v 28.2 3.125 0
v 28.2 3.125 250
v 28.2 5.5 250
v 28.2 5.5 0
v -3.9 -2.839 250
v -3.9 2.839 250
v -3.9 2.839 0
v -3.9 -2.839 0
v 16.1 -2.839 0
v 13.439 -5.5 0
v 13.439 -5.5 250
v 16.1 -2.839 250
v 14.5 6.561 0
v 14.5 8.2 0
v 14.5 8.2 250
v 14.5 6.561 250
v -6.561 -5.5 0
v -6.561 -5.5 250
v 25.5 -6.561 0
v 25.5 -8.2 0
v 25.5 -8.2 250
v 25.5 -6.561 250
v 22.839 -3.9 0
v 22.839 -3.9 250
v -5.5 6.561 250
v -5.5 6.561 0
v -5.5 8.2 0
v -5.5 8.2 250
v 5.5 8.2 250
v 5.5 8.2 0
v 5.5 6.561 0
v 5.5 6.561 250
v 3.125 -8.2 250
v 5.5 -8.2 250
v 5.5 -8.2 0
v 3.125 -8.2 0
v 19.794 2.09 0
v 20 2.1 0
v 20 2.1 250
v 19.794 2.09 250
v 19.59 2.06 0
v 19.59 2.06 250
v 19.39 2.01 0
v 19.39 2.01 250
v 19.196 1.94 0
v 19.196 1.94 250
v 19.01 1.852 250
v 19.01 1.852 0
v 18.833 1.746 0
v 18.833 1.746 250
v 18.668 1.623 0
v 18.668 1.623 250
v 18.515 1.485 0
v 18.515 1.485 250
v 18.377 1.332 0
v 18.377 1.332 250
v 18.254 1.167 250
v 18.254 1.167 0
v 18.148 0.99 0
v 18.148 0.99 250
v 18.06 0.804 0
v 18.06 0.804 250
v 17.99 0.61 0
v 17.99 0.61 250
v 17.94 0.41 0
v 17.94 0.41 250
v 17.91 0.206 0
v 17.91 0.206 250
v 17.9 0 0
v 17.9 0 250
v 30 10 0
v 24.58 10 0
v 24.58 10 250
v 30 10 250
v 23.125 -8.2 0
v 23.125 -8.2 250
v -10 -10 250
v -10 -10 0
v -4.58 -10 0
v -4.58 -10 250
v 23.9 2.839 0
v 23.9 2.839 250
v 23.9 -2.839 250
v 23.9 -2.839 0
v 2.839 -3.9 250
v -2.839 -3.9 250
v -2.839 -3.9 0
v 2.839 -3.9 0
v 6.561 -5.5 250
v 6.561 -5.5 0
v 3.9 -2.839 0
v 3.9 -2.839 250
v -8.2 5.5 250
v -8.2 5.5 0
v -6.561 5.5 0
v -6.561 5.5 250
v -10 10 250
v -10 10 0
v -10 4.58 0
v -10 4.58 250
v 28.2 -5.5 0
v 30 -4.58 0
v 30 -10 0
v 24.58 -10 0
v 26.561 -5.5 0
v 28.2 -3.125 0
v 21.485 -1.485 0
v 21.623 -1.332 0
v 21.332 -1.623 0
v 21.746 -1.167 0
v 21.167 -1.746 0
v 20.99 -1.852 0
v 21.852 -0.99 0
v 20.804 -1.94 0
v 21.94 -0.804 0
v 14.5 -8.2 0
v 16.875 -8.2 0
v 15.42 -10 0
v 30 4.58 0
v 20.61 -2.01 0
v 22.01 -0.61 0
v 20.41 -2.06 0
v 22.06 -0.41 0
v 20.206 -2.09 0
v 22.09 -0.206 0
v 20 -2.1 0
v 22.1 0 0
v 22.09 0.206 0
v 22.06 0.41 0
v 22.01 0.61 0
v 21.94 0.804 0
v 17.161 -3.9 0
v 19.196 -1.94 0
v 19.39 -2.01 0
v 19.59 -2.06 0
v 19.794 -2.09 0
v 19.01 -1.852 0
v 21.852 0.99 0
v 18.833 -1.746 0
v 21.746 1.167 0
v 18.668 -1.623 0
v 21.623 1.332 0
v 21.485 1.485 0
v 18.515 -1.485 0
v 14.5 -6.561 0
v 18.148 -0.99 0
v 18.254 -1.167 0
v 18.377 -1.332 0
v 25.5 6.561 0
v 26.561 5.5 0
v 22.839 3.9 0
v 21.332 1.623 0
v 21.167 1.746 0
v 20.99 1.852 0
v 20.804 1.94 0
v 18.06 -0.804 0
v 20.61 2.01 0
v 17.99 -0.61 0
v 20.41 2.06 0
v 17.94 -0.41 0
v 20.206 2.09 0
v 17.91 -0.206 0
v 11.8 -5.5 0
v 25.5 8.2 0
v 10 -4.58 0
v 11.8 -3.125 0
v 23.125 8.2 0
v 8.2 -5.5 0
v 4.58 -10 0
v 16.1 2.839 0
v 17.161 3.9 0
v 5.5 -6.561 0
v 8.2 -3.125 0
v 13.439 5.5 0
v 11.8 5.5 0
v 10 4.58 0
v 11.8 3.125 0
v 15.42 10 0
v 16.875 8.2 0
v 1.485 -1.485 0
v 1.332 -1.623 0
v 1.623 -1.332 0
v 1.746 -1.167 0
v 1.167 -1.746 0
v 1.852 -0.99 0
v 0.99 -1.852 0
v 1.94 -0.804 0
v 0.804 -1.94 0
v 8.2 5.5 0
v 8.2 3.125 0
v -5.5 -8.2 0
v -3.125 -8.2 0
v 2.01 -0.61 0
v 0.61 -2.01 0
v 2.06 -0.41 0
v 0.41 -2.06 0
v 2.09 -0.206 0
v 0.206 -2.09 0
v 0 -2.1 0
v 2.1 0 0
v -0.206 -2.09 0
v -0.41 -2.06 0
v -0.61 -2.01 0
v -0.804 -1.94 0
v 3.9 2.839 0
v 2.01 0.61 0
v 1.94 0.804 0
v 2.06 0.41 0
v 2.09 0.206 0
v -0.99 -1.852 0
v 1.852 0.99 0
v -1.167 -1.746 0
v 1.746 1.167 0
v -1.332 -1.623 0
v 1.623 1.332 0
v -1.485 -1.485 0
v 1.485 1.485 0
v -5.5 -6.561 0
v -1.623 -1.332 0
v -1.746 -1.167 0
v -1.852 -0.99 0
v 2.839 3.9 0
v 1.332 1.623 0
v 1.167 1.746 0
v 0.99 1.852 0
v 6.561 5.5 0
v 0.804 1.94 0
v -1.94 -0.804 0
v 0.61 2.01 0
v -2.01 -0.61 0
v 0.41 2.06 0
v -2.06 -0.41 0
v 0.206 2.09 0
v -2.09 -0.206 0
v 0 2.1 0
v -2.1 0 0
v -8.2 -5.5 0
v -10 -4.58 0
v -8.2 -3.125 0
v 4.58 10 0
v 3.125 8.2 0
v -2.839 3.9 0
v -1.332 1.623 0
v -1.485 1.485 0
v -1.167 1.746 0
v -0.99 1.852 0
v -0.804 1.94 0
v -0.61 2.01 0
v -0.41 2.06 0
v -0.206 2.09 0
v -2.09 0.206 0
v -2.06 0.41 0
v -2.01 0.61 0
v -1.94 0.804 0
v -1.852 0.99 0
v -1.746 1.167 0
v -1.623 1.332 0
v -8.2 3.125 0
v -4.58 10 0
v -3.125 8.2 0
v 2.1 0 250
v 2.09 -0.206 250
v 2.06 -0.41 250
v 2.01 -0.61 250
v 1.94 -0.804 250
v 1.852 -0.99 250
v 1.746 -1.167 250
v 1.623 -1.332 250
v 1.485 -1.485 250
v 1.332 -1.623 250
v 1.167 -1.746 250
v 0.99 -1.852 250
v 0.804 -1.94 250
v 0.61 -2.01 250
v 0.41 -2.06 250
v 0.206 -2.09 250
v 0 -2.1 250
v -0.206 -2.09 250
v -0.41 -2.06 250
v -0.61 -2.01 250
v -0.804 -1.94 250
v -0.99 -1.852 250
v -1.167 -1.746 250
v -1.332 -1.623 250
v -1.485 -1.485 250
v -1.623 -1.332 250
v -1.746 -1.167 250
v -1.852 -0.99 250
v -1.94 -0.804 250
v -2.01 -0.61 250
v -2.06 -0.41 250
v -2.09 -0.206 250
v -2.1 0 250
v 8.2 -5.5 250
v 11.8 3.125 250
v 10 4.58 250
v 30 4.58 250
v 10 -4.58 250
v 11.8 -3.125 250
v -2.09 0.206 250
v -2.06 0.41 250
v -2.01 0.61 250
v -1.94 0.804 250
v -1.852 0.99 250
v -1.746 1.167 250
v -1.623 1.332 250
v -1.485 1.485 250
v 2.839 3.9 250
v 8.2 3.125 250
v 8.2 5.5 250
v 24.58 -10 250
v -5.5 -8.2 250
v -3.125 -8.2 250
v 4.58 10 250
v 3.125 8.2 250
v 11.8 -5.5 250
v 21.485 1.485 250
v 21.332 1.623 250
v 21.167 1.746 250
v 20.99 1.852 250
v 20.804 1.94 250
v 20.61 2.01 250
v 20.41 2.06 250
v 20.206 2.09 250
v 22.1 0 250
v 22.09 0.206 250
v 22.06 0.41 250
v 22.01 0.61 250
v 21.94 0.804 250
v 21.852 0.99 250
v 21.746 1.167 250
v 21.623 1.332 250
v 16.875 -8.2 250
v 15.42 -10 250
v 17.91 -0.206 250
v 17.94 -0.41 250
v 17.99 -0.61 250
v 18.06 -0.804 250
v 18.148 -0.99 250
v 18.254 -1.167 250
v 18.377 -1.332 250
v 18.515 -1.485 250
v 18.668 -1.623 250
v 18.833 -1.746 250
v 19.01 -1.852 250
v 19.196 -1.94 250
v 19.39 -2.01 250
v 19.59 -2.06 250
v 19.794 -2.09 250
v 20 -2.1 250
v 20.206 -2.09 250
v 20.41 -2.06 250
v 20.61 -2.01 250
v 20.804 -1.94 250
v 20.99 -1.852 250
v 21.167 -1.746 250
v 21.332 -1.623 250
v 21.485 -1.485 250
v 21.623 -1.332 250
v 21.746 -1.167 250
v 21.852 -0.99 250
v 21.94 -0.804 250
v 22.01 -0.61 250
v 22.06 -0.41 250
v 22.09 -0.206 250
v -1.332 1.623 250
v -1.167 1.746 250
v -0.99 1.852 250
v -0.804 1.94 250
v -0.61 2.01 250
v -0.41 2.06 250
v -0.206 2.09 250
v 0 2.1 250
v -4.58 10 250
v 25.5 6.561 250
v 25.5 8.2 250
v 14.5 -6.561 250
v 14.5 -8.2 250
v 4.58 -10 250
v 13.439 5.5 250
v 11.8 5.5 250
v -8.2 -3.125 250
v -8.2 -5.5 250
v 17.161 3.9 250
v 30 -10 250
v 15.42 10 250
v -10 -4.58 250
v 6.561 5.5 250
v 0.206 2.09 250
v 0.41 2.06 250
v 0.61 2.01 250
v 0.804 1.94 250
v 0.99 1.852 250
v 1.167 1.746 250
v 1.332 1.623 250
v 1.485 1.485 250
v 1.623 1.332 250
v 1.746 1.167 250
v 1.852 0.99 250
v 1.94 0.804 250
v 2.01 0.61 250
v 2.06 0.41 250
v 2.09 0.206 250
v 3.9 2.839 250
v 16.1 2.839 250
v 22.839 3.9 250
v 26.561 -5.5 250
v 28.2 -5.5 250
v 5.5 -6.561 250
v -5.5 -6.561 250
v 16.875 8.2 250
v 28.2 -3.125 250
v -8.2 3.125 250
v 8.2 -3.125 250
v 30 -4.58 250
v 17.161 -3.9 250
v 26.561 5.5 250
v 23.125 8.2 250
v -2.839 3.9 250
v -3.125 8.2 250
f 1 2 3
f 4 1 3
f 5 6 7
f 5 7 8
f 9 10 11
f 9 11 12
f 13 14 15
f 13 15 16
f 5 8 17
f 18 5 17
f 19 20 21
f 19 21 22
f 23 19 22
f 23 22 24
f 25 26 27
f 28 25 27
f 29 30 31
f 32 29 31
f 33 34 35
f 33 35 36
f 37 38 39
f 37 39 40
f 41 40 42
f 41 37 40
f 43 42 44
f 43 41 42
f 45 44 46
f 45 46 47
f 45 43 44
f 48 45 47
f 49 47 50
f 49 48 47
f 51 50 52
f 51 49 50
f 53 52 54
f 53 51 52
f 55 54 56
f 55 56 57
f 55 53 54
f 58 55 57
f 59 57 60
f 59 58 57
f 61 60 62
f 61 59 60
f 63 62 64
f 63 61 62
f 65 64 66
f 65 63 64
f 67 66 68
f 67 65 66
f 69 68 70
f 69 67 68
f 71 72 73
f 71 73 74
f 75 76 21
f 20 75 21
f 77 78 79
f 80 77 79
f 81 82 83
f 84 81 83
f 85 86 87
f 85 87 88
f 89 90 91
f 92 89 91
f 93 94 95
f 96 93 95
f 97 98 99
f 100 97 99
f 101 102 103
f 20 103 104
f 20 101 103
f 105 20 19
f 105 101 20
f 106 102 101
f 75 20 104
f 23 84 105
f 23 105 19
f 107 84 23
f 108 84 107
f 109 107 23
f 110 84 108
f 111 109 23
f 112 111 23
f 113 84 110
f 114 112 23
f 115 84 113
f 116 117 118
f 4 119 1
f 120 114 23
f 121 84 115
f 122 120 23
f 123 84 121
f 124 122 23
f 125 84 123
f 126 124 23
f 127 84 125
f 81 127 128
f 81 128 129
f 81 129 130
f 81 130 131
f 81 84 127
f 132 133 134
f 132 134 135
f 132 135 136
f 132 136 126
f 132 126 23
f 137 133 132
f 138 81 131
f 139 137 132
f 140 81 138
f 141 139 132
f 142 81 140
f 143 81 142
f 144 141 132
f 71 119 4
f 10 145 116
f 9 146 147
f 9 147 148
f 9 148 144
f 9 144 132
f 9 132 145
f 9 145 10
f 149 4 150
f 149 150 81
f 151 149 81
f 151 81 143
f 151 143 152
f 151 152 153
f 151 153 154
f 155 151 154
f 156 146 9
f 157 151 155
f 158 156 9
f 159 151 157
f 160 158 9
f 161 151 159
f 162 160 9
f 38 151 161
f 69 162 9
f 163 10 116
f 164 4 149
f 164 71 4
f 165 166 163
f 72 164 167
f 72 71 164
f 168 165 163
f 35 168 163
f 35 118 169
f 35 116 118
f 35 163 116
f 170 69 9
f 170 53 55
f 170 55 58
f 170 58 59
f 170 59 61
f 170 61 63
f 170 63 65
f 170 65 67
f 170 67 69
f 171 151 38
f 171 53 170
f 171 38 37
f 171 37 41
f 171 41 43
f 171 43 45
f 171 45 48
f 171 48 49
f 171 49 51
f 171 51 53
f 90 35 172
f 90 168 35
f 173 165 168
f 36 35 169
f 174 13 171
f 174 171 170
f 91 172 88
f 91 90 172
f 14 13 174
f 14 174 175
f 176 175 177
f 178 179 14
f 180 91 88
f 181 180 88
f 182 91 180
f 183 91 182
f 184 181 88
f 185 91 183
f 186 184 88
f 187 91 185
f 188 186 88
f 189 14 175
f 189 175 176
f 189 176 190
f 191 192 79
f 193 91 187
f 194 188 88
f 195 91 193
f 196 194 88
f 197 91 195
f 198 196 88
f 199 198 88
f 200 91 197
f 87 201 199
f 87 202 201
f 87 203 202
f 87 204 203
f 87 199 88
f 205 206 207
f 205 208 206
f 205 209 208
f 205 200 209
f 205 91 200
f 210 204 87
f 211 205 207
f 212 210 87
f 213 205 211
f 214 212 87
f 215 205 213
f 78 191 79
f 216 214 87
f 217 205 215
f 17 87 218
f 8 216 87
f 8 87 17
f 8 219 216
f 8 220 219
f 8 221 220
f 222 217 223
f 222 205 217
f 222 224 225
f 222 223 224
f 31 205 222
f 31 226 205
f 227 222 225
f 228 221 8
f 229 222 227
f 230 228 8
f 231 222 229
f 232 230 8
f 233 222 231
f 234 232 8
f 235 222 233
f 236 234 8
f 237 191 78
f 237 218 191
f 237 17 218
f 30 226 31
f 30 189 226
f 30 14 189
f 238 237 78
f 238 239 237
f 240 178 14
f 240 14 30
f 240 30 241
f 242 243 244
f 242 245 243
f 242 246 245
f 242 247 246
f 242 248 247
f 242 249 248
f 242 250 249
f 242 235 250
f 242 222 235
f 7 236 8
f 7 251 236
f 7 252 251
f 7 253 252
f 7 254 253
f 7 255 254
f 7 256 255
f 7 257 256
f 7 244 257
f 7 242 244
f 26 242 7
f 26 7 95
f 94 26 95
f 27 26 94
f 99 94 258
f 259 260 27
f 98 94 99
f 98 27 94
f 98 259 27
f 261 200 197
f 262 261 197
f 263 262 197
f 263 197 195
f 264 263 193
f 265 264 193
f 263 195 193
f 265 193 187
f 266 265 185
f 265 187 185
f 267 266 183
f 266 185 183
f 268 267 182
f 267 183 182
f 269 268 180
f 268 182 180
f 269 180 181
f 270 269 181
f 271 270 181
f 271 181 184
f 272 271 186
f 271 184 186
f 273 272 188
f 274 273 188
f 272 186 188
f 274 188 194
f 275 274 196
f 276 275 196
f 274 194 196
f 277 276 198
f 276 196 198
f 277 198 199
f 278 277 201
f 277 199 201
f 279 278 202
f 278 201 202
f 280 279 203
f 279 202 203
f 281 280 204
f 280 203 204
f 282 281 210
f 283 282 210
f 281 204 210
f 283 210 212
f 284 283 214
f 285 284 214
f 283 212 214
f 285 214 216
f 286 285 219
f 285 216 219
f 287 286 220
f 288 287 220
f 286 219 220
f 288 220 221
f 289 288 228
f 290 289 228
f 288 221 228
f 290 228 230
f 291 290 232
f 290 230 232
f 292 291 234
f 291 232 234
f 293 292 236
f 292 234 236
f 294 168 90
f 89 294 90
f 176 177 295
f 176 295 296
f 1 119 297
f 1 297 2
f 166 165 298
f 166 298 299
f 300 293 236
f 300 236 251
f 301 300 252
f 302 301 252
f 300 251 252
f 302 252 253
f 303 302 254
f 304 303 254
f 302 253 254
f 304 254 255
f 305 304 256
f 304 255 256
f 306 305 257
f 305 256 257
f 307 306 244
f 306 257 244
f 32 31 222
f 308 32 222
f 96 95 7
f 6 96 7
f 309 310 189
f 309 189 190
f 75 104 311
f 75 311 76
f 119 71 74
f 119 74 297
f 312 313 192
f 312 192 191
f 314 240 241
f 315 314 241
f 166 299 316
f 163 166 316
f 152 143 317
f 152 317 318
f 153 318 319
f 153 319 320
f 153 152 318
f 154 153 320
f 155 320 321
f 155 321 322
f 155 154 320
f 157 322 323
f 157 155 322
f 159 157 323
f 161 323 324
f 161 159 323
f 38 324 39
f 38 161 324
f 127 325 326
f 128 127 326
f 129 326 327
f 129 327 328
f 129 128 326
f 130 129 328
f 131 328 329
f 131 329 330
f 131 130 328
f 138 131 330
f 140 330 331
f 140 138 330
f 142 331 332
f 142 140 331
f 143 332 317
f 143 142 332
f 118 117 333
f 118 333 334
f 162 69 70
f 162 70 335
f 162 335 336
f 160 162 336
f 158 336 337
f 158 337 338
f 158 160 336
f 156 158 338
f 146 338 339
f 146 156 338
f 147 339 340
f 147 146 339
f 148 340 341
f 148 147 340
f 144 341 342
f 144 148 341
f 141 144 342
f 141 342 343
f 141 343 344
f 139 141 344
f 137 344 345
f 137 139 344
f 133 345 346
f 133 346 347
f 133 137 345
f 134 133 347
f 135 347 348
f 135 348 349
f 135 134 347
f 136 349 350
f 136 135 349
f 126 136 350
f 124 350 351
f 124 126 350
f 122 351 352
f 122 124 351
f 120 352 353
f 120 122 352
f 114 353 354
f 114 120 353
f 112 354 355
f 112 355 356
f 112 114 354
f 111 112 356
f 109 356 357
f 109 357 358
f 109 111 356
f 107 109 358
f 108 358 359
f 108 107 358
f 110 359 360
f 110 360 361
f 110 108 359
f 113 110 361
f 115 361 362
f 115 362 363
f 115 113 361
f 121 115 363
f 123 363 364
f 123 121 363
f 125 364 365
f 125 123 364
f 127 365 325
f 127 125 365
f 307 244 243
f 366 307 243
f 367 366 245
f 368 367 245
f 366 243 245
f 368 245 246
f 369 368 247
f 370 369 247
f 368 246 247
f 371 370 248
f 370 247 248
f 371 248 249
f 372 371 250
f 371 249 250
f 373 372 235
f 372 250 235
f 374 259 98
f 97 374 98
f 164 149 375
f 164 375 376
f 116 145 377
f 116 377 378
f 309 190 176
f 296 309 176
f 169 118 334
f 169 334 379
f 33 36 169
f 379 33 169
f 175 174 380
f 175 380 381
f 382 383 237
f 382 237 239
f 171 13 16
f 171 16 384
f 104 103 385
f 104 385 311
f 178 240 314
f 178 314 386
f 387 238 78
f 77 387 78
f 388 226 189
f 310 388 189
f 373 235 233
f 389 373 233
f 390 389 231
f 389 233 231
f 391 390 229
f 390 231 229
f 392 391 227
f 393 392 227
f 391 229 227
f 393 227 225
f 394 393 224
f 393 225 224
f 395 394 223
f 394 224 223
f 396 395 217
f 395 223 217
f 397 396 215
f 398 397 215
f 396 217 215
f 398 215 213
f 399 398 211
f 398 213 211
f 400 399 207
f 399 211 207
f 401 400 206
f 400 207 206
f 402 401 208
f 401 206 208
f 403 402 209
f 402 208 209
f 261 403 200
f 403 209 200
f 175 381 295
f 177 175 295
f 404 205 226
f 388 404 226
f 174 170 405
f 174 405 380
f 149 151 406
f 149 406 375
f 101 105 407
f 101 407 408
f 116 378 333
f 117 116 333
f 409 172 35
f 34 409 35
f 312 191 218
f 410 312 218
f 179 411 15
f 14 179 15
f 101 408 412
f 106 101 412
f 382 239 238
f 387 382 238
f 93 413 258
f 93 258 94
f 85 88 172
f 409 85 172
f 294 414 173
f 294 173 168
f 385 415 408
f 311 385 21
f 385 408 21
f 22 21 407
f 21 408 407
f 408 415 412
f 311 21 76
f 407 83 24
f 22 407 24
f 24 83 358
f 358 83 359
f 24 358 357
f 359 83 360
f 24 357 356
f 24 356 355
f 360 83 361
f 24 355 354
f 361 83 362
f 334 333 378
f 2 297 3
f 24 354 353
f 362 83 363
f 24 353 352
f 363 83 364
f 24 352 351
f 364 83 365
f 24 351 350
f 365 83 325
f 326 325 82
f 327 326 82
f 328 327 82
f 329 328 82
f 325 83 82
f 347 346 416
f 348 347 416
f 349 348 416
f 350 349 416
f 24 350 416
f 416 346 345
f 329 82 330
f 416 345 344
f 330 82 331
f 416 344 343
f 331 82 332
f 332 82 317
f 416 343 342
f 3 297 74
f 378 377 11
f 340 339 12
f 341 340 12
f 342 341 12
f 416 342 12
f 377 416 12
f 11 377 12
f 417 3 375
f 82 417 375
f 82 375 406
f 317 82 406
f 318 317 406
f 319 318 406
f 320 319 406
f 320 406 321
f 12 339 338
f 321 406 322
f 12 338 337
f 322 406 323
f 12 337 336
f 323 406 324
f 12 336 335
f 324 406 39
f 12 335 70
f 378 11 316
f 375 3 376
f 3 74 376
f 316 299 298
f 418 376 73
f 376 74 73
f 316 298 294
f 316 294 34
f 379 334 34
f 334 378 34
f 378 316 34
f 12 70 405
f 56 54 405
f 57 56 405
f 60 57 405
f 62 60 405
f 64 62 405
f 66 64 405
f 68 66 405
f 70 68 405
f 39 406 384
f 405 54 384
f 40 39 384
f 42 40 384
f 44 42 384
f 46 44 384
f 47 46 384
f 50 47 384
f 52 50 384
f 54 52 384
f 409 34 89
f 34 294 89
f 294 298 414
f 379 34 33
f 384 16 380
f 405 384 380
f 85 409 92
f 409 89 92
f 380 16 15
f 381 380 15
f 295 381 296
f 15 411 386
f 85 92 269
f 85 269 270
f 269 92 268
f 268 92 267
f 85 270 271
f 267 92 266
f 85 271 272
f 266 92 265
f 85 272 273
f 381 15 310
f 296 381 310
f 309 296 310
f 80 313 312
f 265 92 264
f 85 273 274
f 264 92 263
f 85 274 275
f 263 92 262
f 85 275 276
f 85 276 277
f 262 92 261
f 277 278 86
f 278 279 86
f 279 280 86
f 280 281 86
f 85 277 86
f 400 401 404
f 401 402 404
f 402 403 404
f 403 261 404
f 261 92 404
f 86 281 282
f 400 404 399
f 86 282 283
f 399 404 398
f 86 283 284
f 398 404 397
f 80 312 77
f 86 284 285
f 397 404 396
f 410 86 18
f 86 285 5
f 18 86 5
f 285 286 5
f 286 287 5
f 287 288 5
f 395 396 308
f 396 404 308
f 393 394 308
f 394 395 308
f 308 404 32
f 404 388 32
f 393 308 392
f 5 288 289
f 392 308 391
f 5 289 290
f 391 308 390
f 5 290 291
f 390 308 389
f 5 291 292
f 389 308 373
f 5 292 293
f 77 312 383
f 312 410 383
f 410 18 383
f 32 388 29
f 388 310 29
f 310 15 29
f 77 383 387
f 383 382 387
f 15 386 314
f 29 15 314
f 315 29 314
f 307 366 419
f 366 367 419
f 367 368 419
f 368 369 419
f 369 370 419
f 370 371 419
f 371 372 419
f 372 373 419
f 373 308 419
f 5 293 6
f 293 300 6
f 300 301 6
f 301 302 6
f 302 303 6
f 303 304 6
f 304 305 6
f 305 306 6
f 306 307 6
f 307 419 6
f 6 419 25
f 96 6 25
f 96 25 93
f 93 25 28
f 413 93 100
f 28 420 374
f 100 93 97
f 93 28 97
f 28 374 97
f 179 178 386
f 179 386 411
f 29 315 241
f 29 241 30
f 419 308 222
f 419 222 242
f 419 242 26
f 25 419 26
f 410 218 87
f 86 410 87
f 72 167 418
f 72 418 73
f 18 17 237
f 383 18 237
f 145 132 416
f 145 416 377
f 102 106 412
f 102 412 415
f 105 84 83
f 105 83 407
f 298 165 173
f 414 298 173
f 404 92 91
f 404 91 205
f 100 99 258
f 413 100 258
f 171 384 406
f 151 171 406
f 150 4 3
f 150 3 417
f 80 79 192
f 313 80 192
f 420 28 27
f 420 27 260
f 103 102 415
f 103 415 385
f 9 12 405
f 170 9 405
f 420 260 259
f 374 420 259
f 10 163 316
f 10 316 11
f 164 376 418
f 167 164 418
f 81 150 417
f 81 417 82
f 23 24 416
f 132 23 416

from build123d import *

# Parameters (mm, degrees)
BOSS_EXTRUDE1_DEPTH = 250


with BuildPart() as part:
    # Sketch2 → Boss-Extrude1 (new body)
    with BuildSketch(Plane.XY):
        with BuildLine():
            Line((2.839339828, 3.9), (0, 3.9))
            Line((0, 3.9), (0, 2.1))
            ThreePointArc((0, 2.1), (1.48492424, 1.48492424), (2.1, 0))
            ThreePointArc((2.1, 0), (0, -2.1), (-2.1, 0))
            Line((-2.1, 0), (-3.9, 0))
            Line((-3.9, 0), (-3.9, -2.839339828))
            Line((-3.9, -2.839339828), (-6.560660172, -5.5))
            Line((-6.560660172, -5.5), (-8.2, -5.5))
            Line((-8.2, -5.5), (-8.2, -3.125))
            Line((-8.2, -3.125), (-10, -4.58))
            Line((-10, -4.58), (-10, -10))
            Line((-10, -10), (-4.58, -10))
            Line((-4.58, -10), (-3.125, -8.2))
            Line((-3.125, -8.2), (-5.5, -8.2))
            Line((-5.5, -8.2), (-5.5, -6.560660172))
            Line((-5.5, -6.560660172), (-2.839339828, -3.9))
            Line((-2.839339828, -3.9), (0, -3.9))
            Line((0, -3.9), (2.839339828, -3.9))
            Line((2.839339828, -3.9), (5.5, -6.560660172))
            Line((5.5, -6.560660172), (5.5, -8.2))
            Line((5.5, -8.2), (3.125, -8.2))
            Line((3.125, -8.2), (4.58, -10))
            Line((4.58, -10), (10, -10))
            Line((10, -10), (10, -4.58))
            Line((10, -4.58), (8.2, -3.125))
            Line((8.2, -3.125), (8.2, -5.5))
            Line((8.2, -5.5), (6.560660172, -5.5))
            Line((6.560660172, -5.5), (3.9, -2.839339828))
            Line((3.9, -2.839339828), (3.9, 0))
            Line((3.9, 0), (3.9, 2.839339828))
            Line((3.9, 2.839339828), (6.560660172, 5.5))
            Line((6.560660172, 5.5), (8.2, 5.5))
            Line((8.2, 5.5), (8.2, 3.125))
            Line((8.2, 3.125), (10, 4.58))
            Line((10, 4.58), (10, 10))
            Line((10, 10), (4.58, 10))
            Line((4.58, 10), (3.125, 8.2))
            Line((3.125, 8.2), (5.5, 8.2))
            Line((5.5, 8.2), (5.5, 6.560660172))
            Line((5.5, 6.560660172), (2.839339828, 3.9))
        make_face()
        with BuildLine():
            Line((-1.48492424, 1.48492424), (-10, 10))
            Line((-10, 10), (-10, 4.58))
            Line((-10, 4.58), (-8.2, 3.125))
            Line((-8.2, 3.125), (-8.2, 5.5))
            Line((-8.2, 5.5), (-6.560660172, 5.5))
            Line((-6.560660172, 5.5), (-3.9, 2.839339828))
            Line((-3.9, 2.839339828), (-3.9, 0))
            Line((-3.9, 0), (-2.1, 0))
            ThreePointArc((-2.1, 0), (-1.940147018, 0.803635208), (-1.48492424, 1.48492424))
        make_face()
        with BuildLine():
            Line((-5.5, 6.560660172), (-5.5, 8.2))
            Line((-5.5, 8.2), (-3.125, 8.2))
            Line((-3.125, 8.2), (-4.58, 10))
            Line((-4.58, 10), (-10, 10))
            Line((-10, 10), (-1.48492424, 1.48492424))
            ThreePointArc((-1.48492424, 1.48492424), (-0.803635208, 1.940147018), (0, 2.1))
            Line((0, 2.1), (0, 3.9))
            Line((0, 3.9), (-2.839339828, 3.9))
            Line((-2.839339828, 3.9), (-5.5, 6.560660172))
        make_face()
    boss_extrude1 = extrude(amount=BOSS_EXTRUDE1_DEPTH)

    # Mirror1: Boss-Extrude1 across plane
    add(boss_extrude1.mirror(Plane(origin=(10, 0, 250), x_dir=(0, 0, 1), z_dir=(1, 0, 0))))


solid = part.part
